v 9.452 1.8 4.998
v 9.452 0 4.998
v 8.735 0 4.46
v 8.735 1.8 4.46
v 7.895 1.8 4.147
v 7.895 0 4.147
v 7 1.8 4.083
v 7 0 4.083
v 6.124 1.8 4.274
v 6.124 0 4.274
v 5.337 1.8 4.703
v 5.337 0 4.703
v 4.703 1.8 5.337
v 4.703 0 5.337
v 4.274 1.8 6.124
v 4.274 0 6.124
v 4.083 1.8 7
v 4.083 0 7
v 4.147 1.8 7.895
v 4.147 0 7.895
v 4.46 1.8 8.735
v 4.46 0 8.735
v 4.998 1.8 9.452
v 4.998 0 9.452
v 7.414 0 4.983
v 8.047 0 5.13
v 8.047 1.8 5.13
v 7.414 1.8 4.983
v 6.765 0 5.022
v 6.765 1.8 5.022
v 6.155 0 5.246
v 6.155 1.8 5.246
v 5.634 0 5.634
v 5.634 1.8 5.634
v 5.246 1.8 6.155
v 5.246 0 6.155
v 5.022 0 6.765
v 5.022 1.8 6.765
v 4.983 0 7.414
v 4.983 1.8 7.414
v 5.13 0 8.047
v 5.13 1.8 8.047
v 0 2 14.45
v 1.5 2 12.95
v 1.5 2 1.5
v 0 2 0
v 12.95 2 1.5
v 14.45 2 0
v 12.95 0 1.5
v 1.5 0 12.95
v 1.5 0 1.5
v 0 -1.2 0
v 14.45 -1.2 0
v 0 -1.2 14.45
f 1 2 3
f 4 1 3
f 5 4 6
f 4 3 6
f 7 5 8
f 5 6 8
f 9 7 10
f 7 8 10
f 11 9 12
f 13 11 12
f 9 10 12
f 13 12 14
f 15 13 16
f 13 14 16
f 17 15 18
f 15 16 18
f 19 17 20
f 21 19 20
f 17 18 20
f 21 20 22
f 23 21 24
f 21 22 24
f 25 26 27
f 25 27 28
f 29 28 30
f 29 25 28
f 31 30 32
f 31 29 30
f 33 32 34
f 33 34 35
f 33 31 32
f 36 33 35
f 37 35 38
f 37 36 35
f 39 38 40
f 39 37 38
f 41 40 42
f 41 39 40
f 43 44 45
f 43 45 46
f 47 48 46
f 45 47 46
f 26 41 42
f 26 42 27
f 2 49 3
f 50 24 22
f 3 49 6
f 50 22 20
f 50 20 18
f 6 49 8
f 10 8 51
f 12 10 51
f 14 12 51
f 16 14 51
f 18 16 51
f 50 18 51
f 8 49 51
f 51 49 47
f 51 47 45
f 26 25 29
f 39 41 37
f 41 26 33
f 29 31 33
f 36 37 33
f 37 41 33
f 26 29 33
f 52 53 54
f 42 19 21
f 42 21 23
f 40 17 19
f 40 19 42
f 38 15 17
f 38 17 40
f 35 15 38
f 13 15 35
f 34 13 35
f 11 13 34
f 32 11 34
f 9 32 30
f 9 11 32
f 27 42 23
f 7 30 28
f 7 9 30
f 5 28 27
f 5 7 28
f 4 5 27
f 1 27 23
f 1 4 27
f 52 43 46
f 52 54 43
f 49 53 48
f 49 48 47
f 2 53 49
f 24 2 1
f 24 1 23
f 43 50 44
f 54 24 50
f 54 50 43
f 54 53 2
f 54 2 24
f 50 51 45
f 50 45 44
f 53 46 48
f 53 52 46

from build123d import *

# Parameters (mm, degrees)
BOSS_EXTRUDE1_DEPTH = 1.2
BOSS_EXTRUDE2_DEPTH = 2
BOSS_EXTRUDE3_DEPTH = 1.8


with BuildPart() as part:
    # Sketch1 → Boss-Extrude1 (new body)
    with BuildSketch(Plane(origin=(0, 0, 0), x_dir=(1, 0, 0), z_dir=(0, 1, 0))):
        Polygon((0, 0), (14.45, 0), (0, -14.45), align=None)
    extrude(amount=-BOSS_EXTRUDE1_DEPTH)

    # Sketch2 → Boss-Extrude2 (add)
    with BuildSketch(Plane(origin=(0, 0, 0), x_dir=(1, 0, 0), z_dir=(0, 1, 0))):
        Polygon((0, 0), (14.45, 0), (12.95, -1.5), (1.5, -1.5), (1.5, -12.95), (0, -14.45), align=None)
    extrude(amount=BOSS_EXTRUDE2_DEPTH)

    # Sketch3 → Boss-Extrude3 (add)
    with BuildSketch(Plane(origin=(0, 0, 0), x_dir=(1, 0, 0), z_dir=(0, 1, 0))):
        with BuildLine():
            Line((4.997613639, -9.452386361), (9.452386361, -4.997613639))
            ThreePointArc((9.452386361, -4.997613639), (4.997613639, -4.997613639), (4.997613639, -9.452386361))
        make_face()
        with BuildLine():
            Line((5.13043724, -8.046770554), (8.046770554, -5.13043724))
            ThreePointArc((8.046770554, -5.13043724), (5.634009742, -5.634009742), (5.13043724, -8.046770554))
        make_face(mode=Mode.SUBTRACT)
    extrude(amount=BOSS_EXTRUDE3_DEPTH)


solid = part.part
